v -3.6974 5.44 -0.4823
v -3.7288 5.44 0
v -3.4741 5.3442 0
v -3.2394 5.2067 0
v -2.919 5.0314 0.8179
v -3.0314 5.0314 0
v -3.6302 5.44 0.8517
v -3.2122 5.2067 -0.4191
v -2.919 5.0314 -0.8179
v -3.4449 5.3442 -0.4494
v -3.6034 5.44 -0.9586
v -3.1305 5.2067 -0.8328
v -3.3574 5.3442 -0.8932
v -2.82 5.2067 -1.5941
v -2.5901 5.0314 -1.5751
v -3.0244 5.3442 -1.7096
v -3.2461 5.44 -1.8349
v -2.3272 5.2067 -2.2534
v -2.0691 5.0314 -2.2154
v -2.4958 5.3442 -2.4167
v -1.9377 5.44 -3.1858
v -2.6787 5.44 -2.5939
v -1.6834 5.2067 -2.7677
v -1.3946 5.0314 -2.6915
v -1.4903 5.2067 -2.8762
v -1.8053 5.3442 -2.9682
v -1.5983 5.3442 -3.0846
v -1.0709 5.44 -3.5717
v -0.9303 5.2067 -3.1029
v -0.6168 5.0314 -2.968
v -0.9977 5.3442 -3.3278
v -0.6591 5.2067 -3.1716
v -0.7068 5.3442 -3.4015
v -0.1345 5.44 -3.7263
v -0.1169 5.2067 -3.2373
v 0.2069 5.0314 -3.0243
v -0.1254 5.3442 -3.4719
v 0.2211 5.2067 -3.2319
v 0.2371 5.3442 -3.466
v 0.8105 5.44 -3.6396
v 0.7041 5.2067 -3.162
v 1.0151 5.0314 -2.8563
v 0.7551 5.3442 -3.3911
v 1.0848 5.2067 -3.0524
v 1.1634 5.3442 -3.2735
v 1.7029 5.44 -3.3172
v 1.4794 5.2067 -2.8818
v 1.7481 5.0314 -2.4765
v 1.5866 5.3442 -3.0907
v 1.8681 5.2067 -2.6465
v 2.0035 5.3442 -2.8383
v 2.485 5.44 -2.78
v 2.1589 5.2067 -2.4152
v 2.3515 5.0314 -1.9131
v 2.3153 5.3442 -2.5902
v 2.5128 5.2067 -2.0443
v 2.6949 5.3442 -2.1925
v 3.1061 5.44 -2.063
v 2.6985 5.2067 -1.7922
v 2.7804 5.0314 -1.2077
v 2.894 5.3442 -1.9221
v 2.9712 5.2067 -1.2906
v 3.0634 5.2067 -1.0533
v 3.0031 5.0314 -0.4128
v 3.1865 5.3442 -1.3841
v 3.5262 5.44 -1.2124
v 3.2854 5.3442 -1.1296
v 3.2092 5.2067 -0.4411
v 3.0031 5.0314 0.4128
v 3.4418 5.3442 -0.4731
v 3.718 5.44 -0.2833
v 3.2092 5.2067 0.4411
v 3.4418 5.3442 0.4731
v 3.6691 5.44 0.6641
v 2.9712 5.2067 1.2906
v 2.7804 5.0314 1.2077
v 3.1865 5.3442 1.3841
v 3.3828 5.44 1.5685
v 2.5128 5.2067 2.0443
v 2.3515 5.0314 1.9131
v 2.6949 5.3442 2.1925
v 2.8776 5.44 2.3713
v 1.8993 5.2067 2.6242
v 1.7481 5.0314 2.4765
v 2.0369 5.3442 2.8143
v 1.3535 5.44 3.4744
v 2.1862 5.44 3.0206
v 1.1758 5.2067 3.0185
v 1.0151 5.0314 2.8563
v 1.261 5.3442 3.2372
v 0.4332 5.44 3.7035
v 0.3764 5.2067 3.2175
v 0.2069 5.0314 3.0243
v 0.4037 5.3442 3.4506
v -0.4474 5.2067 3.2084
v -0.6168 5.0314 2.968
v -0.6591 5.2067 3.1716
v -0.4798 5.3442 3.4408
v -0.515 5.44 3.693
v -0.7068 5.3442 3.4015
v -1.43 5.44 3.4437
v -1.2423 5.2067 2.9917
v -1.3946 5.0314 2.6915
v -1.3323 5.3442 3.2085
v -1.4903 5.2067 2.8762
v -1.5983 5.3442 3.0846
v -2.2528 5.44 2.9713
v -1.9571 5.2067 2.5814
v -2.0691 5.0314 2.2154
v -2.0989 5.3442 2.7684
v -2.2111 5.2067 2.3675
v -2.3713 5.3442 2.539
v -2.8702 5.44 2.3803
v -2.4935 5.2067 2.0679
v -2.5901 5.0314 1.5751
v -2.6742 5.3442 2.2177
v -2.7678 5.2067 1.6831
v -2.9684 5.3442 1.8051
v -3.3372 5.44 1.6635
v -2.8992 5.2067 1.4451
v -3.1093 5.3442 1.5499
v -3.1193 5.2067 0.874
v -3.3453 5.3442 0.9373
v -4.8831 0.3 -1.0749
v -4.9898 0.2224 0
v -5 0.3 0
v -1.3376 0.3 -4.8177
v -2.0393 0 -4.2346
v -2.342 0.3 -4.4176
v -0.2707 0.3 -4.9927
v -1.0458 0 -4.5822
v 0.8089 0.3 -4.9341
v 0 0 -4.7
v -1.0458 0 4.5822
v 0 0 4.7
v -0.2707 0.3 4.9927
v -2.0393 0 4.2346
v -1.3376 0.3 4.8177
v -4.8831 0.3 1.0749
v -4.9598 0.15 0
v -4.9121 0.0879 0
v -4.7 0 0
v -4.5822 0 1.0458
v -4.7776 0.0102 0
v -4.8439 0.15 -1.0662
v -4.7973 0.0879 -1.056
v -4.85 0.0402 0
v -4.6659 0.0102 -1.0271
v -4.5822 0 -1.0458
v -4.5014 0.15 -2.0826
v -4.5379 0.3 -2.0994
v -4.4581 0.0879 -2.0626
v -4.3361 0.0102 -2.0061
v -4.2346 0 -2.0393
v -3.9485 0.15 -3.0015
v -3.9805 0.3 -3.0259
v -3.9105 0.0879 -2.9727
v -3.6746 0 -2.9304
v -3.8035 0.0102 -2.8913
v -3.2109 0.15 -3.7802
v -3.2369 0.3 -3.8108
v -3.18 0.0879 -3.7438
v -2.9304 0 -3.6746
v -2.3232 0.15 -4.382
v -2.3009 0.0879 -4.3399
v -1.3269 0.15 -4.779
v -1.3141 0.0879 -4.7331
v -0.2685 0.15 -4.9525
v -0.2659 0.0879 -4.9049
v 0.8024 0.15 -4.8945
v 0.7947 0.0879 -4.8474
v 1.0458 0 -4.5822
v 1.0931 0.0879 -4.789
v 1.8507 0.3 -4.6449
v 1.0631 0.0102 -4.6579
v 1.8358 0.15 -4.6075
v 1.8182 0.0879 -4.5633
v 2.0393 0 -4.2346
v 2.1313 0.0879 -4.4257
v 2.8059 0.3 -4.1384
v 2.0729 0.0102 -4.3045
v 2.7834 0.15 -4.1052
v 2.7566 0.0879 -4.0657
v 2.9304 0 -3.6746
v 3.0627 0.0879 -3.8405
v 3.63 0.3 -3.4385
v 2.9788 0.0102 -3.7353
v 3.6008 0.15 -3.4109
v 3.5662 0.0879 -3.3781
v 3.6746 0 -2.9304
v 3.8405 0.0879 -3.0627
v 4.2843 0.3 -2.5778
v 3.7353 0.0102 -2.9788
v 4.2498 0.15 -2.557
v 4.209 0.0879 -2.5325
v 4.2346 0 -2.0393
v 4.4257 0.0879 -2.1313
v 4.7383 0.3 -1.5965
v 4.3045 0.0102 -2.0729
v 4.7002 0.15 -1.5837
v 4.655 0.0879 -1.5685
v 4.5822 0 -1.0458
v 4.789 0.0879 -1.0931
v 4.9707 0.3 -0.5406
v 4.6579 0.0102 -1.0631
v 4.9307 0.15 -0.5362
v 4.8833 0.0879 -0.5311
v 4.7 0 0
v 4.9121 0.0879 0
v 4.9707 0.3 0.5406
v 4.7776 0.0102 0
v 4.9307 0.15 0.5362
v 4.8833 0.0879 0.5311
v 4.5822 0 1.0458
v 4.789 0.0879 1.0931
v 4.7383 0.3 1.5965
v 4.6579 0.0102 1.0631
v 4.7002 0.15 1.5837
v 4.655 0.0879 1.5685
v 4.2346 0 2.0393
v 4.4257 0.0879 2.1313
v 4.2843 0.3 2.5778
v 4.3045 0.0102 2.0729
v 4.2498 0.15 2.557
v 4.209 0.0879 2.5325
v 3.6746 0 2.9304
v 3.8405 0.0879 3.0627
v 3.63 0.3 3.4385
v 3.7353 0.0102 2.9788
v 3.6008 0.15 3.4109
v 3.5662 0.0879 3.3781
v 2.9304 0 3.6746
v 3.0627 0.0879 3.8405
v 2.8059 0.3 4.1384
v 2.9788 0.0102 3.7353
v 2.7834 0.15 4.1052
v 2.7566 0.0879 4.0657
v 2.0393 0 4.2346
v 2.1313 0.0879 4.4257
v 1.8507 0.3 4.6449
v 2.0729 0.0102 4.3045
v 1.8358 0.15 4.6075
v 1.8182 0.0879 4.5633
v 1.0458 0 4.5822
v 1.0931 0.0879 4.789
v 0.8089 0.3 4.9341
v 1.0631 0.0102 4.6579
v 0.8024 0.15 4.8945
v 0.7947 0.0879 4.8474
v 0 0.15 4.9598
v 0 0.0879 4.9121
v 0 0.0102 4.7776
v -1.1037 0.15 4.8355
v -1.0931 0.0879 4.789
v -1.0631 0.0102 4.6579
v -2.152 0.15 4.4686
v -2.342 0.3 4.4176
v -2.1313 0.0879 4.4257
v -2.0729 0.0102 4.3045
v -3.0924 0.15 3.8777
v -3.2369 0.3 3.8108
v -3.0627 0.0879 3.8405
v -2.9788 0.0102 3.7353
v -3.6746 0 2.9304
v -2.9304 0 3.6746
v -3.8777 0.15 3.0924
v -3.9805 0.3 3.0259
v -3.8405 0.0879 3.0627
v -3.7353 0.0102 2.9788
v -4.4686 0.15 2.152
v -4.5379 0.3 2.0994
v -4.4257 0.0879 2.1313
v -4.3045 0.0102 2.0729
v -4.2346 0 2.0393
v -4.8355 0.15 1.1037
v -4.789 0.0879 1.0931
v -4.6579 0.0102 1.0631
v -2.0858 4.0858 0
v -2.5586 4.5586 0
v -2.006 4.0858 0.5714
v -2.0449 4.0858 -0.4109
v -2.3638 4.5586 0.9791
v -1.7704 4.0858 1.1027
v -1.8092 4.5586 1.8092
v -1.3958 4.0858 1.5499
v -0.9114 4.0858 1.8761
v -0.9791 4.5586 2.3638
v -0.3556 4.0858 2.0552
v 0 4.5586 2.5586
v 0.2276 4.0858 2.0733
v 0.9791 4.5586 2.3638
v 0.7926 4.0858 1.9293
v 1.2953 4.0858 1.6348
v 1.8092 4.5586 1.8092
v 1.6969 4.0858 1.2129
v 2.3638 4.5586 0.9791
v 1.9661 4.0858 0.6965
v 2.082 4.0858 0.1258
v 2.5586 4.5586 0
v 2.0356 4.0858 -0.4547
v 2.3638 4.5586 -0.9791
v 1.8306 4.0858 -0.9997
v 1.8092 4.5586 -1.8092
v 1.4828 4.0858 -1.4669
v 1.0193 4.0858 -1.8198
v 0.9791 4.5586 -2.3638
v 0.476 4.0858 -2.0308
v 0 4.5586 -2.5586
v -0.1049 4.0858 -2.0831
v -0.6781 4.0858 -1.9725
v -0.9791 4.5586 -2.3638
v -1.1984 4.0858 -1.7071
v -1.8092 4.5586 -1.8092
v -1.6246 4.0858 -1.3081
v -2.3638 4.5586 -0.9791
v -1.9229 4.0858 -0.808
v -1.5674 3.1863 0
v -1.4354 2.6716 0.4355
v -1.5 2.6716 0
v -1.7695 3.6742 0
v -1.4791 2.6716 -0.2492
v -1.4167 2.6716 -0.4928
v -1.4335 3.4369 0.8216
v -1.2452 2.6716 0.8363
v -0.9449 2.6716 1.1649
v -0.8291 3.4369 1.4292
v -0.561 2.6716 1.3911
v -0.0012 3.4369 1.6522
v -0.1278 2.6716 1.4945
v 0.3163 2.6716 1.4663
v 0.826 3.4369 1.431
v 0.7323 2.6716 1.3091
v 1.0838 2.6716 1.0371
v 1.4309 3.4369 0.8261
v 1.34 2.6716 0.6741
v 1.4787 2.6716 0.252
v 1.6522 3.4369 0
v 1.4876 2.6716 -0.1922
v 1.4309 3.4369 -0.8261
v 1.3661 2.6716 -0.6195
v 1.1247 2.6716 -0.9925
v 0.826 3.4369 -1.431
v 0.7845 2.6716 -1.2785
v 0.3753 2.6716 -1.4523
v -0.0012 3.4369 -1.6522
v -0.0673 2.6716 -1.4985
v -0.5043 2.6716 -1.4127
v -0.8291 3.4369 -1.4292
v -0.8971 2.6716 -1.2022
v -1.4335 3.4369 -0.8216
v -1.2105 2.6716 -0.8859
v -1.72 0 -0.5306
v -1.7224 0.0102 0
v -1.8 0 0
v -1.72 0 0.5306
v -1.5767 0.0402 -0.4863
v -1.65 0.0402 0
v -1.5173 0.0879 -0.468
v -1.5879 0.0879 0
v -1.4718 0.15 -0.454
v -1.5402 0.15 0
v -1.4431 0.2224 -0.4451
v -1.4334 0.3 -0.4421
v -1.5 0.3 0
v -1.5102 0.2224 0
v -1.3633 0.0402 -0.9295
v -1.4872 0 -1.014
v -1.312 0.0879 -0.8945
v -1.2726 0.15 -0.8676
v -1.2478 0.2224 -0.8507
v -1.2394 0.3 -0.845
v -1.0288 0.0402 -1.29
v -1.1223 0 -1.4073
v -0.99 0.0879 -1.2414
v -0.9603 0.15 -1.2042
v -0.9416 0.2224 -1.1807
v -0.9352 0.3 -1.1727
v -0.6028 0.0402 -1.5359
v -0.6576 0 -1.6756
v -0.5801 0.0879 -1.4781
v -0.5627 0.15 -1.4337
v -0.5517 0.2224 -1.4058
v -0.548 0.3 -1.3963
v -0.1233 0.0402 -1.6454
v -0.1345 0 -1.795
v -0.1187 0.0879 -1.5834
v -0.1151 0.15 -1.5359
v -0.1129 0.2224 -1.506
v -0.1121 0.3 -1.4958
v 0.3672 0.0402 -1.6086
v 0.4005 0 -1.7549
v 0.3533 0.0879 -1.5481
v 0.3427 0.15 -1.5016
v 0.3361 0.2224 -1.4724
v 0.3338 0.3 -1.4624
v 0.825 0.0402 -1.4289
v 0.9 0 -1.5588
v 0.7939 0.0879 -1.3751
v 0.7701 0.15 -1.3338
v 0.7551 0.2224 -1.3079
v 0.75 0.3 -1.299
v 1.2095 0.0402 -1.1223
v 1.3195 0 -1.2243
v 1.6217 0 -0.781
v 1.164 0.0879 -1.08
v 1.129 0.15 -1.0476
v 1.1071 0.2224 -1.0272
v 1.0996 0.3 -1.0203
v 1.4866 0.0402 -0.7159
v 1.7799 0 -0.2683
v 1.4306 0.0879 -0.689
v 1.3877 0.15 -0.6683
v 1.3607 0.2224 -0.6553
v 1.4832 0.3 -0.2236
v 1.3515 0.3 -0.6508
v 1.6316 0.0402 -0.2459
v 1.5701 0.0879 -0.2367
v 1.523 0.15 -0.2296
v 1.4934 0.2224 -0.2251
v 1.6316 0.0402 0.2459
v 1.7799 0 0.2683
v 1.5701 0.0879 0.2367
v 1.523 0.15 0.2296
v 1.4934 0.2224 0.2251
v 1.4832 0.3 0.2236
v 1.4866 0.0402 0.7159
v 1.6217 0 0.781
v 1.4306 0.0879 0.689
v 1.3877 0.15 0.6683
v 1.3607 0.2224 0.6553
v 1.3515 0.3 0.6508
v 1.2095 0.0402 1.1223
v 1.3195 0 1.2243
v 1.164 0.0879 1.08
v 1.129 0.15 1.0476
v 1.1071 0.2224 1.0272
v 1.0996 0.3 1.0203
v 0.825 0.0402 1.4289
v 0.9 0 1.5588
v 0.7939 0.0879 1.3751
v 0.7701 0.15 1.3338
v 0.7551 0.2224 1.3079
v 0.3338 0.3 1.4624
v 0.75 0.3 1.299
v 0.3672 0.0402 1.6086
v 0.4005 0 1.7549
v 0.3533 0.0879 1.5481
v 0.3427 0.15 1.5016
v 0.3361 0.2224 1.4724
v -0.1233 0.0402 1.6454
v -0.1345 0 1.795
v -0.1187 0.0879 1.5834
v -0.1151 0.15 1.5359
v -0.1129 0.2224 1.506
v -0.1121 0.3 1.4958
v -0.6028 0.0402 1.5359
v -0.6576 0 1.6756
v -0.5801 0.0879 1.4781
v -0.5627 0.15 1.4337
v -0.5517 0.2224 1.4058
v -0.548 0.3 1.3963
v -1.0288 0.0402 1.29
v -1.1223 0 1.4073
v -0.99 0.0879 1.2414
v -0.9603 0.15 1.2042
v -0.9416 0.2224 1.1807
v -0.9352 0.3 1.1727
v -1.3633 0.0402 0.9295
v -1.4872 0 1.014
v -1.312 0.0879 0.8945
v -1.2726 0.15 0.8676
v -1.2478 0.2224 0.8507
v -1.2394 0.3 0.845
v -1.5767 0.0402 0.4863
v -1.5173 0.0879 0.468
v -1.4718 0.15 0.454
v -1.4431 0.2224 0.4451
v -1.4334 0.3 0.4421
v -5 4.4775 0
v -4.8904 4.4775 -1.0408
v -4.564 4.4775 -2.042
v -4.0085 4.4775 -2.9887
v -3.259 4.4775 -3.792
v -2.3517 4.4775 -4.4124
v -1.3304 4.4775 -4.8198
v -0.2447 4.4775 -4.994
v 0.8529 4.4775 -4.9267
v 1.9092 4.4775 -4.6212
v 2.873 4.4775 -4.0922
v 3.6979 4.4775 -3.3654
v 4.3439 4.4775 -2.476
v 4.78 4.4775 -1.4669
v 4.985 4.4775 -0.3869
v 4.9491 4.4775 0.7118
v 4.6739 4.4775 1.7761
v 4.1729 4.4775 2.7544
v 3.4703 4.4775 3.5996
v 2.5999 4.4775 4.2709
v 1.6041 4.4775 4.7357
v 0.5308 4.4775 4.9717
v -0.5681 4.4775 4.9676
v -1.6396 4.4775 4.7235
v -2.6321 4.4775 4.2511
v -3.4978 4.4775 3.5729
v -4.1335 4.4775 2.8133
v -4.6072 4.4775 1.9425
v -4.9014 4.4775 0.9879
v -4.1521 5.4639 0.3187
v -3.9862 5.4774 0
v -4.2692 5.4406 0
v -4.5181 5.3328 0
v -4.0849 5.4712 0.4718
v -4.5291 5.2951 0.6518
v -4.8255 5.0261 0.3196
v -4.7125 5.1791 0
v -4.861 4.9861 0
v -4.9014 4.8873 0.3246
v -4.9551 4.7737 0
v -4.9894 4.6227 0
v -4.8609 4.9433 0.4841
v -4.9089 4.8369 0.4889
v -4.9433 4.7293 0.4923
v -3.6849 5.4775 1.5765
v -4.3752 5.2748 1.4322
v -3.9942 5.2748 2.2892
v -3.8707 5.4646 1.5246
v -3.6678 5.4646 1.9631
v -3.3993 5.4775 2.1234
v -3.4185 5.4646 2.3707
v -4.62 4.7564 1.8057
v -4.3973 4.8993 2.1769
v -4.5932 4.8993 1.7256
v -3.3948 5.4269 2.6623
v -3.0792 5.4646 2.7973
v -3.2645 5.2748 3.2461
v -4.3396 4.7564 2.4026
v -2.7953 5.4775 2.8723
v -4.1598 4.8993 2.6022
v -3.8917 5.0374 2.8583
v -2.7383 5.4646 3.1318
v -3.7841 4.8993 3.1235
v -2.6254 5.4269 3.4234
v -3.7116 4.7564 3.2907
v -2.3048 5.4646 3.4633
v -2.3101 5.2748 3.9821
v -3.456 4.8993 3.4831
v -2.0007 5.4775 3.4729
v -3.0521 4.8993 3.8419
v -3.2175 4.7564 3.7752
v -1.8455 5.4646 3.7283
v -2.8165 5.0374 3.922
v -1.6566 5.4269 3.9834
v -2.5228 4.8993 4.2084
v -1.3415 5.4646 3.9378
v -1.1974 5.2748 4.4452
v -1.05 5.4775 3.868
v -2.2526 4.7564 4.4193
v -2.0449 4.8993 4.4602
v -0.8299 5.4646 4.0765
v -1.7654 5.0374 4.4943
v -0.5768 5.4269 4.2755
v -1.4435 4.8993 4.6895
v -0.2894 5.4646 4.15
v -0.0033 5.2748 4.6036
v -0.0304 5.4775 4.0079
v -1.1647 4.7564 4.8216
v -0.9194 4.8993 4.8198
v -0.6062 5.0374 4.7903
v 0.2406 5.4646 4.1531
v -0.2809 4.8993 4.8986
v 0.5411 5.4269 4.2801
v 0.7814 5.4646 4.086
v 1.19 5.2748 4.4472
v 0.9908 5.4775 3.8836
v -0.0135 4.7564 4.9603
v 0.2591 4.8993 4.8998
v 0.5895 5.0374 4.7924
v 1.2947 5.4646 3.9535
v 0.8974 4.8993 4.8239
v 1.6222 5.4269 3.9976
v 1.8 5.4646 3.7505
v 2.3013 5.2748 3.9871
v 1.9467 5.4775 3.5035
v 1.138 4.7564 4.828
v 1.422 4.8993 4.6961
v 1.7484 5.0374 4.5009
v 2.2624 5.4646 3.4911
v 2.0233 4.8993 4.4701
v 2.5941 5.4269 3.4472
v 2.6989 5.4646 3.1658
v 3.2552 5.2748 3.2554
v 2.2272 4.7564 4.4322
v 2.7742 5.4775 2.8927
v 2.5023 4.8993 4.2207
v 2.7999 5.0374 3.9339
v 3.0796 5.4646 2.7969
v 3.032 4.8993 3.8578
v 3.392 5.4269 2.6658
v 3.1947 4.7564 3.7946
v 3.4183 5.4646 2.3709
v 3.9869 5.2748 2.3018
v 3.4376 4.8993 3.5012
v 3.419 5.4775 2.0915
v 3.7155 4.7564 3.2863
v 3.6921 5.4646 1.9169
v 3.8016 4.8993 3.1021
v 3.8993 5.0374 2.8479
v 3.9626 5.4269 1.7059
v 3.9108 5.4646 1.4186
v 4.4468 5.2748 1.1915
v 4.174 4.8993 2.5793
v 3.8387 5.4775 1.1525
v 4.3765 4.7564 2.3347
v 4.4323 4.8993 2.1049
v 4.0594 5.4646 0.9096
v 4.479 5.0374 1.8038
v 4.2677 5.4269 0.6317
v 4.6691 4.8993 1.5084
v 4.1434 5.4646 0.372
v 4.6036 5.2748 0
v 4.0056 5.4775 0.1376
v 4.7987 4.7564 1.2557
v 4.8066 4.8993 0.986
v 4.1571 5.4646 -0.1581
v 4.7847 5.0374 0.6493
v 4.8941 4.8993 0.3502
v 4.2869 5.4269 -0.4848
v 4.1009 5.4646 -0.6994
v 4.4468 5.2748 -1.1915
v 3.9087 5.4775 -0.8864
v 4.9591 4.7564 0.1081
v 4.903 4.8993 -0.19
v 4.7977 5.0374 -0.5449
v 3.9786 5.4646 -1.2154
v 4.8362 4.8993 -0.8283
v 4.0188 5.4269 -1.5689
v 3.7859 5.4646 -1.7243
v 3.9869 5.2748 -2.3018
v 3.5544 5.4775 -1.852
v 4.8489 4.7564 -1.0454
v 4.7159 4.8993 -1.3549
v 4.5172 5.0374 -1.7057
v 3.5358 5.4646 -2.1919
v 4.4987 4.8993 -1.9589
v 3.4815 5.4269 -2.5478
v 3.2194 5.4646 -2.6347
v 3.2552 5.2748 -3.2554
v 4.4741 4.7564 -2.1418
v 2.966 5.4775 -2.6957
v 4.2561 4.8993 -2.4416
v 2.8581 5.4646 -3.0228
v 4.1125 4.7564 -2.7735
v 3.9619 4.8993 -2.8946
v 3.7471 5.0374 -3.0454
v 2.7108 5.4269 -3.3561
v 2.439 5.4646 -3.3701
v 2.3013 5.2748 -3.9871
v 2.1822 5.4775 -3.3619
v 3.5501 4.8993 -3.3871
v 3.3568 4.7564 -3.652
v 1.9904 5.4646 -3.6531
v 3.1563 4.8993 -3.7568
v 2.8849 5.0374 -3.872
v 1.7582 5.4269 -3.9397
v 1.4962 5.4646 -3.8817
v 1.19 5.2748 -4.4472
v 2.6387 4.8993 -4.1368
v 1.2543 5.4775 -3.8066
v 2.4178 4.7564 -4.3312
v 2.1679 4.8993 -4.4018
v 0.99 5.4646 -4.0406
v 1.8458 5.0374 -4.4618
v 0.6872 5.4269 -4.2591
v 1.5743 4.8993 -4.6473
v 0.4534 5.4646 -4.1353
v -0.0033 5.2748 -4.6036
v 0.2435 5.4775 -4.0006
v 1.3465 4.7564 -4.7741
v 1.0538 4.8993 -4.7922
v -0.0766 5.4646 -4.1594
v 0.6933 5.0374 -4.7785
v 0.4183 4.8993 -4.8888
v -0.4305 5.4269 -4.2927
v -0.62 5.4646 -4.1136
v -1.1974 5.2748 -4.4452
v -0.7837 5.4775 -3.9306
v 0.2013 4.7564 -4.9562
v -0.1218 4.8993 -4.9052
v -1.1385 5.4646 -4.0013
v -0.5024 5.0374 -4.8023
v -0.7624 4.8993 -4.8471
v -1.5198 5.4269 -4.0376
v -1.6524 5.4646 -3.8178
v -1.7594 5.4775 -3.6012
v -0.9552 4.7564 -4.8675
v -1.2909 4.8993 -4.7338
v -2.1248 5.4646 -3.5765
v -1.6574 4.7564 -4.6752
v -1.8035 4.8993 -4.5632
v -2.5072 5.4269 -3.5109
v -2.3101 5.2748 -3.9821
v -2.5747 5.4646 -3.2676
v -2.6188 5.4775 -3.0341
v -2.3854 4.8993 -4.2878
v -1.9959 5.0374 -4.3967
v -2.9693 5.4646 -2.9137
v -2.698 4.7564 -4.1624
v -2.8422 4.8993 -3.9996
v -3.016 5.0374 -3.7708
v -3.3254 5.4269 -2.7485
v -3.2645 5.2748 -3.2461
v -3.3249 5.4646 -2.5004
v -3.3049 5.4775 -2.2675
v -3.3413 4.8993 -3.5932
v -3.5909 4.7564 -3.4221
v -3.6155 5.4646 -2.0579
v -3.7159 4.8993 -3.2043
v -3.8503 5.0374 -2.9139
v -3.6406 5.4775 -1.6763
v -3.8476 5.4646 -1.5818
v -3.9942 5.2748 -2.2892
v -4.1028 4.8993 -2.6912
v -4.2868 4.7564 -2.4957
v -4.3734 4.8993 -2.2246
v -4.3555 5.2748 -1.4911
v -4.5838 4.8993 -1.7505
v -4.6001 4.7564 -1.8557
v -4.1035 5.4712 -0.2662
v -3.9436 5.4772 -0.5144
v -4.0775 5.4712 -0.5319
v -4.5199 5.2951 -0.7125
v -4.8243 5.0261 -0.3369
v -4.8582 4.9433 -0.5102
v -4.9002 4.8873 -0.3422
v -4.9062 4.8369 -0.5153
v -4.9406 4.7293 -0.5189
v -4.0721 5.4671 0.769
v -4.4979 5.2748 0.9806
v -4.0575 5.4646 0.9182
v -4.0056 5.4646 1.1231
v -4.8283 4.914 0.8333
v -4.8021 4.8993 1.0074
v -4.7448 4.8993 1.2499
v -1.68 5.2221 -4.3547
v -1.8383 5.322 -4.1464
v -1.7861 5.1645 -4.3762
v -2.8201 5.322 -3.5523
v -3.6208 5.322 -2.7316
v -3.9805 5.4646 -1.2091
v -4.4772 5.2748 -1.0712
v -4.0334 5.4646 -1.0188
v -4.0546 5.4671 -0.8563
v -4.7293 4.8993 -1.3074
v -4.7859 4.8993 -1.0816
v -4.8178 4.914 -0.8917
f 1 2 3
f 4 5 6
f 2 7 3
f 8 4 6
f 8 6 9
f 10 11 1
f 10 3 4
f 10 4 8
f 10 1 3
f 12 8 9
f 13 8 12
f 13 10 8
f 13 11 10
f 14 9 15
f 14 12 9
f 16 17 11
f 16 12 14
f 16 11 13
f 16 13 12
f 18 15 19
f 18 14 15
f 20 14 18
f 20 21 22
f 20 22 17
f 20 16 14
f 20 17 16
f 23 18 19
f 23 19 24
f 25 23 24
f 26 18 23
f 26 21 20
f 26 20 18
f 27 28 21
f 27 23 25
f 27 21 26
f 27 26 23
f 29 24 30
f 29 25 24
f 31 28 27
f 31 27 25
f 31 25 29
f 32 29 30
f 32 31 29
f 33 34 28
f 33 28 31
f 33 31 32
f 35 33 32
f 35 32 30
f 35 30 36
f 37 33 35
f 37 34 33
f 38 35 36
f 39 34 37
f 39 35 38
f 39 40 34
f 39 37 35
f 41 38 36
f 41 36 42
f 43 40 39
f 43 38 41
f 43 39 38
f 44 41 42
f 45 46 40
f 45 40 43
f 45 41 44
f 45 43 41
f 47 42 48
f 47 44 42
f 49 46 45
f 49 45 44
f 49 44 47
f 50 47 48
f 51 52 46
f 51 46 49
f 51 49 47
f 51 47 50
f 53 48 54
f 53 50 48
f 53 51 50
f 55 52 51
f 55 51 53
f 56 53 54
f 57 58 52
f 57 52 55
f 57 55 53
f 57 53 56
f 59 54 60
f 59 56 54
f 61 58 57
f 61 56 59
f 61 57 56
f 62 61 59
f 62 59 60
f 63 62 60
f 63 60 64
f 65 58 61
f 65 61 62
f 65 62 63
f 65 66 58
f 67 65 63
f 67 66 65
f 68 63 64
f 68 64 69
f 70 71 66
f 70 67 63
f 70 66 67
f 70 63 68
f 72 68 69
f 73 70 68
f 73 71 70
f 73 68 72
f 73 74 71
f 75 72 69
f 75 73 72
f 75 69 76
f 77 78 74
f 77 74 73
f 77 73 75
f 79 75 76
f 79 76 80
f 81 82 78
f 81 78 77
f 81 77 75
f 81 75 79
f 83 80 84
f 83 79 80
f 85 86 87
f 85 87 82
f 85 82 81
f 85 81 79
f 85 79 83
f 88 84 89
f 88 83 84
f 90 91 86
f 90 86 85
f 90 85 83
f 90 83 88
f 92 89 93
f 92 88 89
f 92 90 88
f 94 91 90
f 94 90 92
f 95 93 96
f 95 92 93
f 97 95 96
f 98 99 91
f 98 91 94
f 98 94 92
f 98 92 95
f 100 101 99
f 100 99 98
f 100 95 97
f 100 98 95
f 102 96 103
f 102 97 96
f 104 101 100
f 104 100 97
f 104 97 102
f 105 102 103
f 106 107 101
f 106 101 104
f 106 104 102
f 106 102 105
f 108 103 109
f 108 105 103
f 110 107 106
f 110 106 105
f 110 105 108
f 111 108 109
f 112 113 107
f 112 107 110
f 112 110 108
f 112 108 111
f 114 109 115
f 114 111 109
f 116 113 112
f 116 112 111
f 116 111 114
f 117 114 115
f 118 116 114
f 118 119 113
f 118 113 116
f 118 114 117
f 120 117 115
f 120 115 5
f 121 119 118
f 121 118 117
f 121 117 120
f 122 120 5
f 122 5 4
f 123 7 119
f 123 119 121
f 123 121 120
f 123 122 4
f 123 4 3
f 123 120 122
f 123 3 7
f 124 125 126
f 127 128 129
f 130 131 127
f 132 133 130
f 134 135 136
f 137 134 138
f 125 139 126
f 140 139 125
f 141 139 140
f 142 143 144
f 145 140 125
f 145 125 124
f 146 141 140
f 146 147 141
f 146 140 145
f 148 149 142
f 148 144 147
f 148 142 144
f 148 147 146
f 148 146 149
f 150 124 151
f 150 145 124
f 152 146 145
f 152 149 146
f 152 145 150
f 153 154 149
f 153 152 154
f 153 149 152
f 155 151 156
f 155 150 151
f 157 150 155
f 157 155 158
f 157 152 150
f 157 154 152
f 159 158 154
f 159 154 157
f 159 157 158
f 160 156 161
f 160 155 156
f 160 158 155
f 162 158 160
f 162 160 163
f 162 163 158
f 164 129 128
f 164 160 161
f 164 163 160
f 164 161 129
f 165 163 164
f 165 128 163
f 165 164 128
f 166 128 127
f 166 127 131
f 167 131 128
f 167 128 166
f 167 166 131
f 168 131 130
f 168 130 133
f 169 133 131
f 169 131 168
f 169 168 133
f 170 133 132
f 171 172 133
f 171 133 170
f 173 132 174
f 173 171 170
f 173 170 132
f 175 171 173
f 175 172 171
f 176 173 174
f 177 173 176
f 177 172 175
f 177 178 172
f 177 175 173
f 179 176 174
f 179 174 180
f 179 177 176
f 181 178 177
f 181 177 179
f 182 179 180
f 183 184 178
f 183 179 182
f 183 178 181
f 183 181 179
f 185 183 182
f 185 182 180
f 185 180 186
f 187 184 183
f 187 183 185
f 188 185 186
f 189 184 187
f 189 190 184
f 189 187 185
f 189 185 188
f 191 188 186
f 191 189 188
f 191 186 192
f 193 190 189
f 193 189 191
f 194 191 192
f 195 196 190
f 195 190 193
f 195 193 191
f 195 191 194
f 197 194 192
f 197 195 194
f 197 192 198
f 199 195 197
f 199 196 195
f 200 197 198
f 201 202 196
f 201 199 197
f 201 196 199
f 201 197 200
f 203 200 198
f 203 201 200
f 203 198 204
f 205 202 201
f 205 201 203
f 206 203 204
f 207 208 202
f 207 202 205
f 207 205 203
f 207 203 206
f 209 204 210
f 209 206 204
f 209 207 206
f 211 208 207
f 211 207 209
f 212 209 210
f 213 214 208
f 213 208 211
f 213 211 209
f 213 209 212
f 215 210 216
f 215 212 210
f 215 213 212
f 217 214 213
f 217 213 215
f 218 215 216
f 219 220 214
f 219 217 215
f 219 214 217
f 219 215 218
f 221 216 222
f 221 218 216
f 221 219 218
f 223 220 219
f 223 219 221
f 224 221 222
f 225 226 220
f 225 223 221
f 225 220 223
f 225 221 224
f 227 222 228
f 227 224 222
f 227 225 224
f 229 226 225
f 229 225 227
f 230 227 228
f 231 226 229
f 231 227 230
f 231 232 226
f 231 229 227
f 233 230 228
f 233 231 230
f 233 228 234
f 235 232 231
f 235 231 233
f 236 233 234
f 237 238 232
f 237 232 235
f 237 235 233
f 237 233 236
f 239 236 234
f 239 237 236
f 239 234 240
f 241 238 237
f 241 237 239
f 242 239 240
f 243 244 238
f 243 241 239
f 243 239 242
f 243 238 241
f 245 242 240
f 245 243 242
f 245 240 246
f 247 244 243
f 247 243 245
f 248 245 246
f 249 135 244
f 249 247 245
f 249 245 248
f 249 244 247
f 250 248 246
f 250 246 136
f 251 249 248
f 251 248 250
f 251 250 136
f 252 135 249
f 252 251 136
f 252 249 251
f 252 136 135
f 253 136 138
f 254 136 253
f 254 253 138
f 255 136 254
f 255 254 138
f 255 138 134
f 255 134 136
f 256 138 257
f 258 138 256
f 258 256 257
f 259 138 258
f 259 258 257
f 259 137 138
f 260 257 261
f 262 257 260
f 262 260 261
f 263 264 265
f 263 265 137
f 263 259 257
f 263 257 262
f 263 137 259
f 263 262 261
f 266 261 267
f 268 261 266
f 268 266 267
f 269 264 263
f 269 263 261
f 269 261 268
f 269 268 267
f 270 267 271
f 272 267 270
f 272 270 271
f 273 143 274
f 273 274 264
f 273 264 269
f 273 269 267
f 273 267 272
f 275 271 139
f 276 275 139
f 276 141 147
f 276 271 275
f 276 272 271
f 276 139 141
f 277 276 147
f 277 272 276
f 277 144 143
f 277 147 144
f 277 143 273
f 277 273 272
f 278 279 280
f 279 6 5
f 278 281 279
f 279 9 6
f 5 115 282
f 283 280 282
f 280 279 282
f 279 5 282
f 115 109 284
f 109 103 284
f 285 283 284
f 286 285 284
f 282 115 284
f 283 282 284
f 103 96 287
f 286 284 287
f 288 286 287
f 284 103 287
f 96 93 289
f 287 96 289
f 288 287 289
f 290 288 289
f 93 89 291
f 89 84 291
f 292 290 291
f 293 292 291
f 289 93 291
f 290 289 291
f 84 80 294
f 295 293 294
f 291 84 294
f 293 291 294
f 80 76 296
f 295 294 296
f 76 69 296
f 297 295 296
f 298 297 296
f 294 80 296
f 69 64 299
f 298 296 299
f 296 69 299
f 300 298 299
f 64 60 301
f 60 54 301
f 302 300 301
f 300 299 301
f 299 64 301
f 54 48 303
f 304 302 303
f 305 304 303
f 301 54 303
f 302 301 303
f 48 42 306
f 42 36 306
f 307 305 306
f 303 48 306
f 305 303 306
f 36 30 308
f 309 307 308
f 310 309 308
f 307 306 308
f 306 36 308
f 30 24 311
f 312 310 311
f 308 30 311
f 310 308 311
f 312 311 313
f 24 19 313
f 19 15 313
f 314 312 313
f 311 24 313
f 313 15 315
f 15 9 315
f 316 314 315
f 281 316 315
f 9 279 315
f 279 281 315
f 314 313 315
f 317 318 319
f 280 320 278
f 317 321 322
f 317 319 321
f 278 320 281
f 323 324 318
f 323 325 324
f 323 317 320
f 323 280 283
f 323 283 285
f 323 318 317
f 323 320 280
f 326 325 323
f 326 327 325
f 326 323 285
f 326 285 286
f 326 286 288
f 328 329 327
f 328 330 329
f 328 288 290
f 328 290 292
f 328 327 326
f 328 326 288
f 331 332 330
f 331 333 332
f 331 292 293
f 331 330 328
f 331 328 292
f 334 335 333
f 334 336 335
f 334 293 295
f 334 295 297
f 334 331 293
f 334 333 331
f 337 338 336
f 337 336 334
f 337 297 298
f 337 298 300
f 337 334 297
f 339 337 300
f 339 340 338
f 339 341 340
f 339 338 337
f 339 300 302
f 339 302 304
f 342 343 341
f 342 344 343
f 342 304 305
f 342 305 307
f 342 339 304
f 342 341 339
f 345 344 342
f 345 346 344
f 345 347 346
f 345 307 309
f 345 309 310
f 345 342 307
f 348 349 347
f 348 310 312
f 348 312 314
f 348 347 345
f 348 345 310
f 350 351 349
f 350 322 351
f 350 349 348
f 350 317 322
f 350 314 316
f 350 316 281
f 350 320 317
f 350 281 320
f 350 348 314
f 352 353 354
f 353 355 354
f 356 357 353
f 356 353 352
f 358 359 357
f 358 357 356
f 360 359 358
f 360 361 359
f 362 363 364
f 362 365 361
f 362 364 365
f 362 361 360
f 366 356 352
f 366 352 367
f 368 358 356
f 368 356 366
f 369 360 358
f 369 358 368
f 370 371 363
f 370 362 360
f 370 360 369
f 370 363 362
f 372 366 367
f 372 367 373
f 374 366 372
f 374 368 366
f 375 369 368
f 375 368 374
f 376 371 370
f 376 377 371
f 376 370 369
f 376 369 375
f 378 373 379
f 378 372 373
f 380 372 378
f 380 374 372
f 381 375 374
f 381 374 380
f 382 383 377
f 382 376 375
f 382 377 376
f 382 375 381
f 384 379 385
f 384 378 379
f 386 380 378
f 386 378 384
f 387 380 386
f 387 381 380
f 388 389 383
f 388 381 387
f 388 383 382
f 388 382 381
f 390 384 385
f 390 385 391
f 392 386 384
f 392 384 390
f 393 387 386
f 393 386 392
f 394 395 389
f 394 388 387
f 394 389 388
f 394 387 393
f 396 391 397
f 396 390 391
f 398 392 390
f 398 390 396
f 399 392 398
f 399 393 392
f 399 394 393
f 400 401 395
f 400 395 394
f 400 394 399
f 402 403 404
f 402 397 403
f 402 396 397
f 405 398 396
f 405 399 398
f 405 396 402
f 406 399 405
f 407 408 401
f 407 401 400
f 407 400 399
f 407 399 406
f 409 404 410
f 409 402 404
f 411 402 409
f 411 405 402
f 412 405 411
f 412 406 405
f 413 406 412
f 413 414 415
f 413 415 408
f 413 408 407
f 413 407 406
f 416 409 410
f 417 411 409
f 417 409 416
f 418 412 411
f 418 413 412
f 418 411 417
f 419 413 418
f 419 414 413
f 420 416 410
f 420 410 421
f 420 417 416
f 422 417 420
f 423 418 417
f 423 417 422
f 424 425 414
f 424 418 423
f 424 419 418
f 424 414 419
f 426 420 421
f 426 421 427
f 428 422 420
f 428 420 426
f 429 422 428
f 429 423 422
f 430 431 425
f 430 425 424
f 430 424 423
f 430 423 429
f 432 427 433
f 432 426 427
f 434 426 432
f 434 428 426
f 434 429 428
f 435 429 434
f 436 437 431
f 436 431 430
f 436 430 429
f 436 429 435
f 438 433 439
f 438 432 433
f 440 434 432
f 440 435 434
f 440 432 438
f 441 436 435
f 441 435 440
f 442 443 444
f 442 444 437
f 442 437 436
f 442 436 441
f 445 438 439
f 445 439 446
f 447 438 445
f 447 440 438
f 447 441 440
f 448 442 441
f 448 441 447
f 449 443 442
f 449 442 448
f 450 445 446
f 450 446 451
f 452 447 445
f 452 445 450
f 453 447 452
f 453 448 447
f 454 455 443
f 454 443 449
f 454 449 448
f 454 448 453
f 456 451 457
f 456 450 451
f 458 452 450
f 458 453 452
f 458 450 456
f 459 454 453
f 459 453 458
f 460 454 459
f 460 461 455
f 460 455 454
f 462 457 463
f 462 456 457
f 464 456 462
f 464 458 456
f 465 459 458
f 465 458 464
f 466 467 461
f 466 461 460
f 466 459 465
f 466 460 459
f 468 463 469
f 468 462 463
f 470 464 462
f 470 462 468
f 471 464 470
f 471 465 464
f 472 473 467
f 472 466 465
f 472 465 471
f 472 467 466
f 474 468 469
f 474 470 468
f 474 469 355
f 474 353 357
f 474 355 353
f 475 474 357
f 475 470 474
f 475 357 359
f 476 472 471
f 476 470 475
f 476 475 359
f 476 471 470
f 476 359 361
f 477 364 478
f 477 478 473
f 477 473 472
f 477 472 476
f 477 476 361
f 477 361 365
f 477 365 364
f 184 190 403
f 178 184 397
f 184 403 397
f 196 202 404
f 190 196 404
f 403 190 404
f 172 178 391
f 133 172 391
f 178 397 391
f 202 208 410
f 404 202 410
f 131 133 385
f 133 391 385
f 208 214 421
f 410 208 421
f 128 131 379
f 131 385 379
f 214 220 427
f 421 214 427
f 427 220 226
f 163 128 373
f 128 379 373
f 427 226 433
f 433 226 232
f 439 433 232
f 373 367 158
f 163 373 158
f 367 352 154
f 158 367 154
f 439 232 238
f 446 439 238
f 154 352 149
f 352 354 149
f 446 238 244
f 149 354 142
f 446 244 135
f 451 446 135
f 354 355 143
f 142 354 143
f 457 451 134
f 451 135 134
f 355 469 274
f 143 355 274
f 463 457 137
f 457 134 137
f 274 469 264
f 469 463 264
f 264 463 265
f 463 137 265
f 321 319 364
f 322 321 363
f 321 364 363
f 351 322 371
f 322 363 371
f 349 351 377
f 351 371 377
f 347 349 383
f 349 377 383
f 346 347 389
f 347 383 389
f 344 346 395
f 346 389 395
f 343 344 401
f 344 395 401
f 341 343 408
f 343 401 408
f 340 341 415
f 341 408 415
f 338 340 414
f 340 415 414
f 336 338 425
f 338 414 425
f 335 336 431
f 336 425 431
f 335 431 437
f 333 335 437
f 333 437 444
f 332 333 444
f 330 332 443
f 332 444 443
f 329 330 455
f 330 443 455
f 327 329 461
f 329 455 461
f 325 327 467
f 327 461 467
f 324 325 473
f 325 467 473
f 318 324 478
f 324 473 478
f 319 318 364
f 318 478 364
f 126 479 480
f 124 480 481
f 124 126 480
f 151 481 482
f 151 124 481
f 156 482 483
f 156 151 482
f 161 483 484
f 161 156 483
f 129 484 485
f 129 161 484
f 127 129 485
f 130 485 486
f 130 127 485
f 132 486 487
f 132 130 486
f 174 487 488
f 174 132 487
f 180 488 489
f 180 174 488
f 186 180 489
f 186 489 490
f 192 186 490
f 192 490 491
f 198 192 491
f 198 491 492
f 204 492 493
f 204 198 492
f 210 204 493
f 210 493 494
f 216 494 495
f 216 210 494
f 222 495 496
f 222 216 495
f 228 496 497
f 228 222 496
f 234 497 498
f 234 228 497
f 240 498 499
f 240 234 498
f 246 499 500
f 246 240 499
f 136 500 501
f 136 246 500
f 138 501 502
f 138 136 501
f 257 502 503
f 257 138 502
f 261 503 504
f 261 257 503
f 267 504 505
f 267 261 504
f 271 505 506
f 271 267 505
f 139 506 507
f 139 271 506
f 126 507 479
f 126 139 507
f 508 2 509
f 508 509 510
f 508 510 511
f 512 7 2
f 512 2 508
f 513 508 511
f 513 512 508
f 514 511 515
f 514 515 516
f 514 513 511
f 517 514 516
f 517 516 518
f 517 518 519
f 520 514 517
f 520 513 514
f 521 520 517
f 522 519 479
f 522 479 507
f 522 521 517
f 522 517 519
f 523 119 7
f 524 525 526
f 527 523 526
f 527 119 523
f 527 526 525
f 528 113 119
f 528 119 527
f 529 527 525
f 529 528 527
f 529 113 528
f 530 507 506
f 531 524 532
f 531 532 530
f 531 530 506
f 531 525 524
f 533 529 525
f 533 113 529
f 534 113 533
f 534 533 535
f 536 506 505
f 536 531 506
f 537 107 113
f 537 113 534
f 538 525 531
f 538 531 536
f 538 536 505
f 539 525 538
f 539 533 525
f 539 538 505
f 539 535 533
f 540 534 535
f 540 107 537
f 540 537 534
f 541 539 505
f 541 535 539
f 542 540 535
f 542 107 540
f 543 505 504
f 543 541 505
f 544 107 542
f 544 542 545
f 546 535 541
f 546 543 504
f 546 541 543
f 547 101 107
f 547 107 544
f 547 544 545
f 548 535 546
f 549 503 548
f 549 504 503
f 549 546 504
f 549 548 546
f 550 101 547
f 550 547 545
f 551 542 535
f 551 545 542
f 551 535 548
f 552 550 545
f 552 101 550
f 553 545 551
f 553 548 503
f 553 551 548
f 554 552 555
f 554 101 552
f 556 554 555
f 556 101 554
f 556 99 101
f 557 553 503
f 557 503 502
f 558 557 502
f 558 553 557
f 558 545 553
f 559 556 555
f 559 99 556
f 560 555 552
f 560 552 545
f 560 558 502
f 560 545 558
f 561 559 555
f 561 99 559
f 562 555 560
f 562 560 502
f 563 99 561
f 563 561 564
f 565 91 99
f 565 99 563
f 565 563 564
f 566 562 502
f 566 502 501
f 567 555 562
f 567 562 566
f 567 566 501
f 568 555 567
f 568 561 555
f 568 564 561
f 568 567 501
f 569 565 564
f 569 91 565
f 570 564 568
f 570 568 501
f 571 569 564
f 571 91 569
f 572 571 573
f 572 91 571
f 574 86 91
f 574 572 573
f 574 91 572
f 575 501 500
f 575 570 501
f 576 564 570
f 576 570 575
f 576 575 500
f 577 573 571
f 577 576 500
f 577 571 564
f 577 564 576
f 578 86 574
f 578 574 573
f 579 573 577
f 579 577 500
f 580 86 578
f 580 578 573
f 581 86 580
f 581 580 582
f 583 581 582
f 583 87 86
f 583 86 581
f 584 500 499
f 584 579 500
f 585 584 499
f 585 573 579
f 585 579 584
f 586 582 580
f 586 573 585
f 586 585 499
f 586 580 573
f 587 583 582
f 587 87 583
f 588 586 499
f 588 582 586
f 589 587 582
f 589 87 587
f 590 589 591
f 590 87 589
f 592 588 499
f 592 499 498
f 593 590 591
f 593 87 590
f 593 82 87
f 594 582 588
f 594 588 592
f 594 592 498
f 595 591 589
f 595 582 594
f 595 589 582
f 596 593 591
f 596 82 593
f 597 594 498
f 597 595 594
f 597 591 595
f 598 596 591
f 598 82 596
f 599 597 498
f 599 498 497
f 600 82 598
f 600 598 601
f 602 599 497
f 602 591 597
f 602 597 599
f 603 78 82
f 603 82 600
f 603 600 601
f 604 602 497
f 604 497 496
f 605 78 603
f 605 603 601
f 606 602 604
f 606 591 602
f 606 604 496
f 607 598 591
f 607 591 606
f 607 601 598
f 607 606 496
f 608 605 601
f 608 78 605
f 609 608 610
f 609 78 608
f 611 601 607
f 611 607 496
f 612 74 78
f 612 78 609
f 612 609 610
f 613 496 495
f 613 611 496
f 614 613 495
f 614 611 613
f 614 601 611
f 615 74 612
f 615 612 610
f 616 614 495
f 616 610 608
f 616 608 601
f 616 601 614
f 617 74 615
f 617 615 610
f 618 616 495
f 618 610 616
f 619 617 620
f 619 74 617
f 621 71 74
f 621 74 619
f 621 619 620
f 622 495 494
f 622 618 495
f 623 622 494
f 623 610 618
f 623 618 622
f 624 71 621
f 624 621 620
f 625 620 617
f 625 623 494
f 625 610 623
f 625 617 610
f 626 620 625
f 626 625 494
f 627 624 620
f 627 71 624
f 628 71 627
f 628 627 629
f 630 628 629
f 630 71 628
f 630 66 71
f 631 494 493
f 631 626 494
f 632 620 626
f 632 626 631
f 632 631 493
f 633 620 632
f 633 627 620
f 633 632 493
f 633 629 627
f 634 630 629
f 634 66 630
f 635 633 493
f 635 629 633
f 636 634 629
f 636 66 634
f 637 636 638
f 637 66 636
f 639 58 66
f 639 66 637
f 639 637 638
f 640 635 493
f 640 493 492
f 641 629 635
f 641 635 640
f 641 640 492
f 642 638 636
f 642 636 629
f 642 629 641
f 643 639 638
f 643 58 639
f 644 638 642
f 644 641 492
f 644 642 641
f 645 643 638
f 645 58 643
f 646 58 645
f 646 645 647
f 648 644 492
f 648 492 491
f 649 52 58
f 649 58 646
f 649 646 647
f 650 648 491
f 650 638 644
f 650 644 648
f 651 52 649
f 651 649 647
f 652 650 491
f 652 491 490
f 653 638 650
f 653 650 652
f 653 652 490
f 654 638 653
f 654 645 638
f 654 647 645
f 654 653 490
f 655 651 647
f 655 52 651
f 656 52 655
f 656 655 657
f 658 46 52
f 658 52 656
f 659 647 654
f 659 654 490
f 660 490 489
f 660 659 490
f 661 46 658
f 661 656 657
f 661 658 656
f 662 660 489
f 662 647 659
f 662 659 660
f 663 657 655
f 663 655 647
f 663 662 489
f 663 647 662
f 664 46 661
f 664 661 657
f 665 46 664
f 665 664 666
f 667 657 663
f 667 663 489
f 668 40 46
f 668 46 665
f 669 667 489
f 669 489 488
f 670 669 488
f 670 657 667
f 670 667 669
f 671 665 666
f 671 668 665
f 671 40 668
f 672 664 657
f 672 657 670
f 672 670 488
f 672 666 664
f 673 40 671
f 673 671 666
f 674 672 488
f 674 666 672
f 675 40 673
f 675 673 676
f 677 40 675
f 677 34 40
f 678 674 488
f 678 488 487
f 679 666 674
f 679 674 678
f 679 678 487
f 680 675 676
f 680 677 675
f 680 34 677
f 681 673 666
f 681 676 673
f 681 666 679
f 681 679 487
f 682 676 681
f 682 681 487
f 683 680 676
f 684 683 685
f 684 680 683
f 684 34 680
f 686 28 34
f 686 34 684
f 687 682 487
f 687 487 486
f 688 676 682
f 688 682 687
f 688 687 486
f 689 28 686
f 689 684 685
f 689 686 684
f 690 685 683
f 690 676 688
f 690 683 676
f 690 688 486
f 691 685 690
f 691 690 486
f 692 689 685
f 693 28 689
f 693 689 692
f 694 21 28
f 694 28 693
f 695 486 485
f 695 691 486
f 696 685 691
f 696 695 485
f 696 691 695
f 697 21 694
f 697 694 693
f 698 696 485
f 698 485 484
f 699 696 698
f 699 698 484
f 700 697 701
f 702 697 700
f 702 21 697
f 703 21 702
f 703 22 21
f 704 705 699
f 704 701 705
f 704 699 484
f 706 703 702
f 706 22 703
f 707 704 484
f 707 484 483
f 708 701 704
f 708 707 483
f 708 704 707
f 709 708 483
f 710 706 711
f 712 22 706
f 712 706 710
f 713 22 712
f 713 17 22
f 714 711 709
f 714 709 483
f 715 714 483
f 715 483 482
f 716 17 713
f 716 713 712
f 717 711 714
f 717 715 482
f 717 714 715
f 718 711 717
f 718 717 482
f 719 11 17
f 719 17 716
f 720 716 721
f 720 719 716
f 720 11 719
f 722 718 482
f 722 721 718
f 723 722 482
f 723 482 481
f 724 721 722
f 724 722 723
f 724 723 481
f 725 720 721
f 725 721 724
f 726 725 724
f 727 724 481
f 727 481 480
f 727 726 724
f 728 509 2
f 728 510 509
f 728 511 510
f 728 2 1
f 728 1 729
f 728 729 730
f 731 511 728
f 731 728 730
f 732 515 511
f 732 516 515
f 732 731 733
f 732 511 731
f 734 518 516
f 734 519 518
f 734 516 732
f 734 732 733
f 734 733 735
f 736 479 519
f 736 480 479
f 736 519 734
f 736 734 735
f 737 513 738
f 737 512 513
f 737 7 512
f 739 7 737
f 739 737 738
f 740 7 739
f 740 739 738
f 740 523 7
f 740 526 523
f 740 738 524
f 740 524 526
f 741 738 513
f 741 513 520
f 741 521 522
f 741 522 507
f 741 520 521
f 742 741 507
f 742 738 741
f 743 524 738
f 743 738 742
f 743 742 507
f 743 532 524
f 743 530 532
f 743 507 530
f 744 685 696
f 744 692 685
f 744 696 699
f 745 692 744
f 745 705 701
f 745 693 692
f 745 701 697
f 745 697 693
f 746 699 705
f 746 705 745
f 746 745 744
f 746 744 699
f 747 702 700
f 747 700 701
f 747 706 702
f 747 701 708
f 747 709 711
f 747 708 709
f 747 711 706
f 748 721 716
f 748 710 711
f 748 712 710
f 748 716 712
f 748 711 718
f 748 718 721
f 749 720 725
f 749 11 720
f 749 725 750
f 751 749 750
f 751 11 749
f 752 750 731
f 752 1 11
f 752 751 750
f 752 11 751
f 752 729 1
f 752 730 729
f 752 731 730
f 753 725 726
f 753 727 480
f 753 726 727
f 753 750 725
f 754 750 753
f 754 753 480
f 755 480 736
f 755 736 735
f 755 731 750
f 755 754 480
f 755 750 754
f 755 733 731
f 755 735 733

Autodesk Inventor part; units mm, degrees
ref_plane "YZ Plane" through (0, 0, 0) normal (1, 0, 0) x (0, 1, 0)
ref_plane "XZ Plane" through (0, 0, 0) normal (0, 1, 0) x (-1, 0, 0)
ref_plane "XY Plane" through (0, 0, 0) normal (0, 0, 1) x (1, 0, 0)
sketch "Sketch1" plane through (0, 0, 0) normal (0, 1, 0) x (-1, 0, 0)
  circle A0 centre (0, 0) radius 5
  circle A1 centre (0, 0) radius 1.5
  dimension "d0" = 10
  dimension "d1" = 3
extrude "Extrusion1" add sketch "Sketch1" along normal blind 5.5
chamfer "Chamfer1" distance 2 angle 45 1 edges at (1.5, 5.5, 0)
fillet "Fillet1" radius 2 1 edges at (1.5, 3.5, 0)
fillet "Fillet2" radius 1.6 1 edges at (3.5, 5.5, 0)
fillet "Fillet3" radius 1 1 edges at (5, 5.5, 0)
fillet "Fillet4" radius 0.3 1 edges at (5, 0, 0)
fillet "Fillet5" radius 0.3 1 edges at (1.5, 0, 0)
properties part number "TransformerLug"
